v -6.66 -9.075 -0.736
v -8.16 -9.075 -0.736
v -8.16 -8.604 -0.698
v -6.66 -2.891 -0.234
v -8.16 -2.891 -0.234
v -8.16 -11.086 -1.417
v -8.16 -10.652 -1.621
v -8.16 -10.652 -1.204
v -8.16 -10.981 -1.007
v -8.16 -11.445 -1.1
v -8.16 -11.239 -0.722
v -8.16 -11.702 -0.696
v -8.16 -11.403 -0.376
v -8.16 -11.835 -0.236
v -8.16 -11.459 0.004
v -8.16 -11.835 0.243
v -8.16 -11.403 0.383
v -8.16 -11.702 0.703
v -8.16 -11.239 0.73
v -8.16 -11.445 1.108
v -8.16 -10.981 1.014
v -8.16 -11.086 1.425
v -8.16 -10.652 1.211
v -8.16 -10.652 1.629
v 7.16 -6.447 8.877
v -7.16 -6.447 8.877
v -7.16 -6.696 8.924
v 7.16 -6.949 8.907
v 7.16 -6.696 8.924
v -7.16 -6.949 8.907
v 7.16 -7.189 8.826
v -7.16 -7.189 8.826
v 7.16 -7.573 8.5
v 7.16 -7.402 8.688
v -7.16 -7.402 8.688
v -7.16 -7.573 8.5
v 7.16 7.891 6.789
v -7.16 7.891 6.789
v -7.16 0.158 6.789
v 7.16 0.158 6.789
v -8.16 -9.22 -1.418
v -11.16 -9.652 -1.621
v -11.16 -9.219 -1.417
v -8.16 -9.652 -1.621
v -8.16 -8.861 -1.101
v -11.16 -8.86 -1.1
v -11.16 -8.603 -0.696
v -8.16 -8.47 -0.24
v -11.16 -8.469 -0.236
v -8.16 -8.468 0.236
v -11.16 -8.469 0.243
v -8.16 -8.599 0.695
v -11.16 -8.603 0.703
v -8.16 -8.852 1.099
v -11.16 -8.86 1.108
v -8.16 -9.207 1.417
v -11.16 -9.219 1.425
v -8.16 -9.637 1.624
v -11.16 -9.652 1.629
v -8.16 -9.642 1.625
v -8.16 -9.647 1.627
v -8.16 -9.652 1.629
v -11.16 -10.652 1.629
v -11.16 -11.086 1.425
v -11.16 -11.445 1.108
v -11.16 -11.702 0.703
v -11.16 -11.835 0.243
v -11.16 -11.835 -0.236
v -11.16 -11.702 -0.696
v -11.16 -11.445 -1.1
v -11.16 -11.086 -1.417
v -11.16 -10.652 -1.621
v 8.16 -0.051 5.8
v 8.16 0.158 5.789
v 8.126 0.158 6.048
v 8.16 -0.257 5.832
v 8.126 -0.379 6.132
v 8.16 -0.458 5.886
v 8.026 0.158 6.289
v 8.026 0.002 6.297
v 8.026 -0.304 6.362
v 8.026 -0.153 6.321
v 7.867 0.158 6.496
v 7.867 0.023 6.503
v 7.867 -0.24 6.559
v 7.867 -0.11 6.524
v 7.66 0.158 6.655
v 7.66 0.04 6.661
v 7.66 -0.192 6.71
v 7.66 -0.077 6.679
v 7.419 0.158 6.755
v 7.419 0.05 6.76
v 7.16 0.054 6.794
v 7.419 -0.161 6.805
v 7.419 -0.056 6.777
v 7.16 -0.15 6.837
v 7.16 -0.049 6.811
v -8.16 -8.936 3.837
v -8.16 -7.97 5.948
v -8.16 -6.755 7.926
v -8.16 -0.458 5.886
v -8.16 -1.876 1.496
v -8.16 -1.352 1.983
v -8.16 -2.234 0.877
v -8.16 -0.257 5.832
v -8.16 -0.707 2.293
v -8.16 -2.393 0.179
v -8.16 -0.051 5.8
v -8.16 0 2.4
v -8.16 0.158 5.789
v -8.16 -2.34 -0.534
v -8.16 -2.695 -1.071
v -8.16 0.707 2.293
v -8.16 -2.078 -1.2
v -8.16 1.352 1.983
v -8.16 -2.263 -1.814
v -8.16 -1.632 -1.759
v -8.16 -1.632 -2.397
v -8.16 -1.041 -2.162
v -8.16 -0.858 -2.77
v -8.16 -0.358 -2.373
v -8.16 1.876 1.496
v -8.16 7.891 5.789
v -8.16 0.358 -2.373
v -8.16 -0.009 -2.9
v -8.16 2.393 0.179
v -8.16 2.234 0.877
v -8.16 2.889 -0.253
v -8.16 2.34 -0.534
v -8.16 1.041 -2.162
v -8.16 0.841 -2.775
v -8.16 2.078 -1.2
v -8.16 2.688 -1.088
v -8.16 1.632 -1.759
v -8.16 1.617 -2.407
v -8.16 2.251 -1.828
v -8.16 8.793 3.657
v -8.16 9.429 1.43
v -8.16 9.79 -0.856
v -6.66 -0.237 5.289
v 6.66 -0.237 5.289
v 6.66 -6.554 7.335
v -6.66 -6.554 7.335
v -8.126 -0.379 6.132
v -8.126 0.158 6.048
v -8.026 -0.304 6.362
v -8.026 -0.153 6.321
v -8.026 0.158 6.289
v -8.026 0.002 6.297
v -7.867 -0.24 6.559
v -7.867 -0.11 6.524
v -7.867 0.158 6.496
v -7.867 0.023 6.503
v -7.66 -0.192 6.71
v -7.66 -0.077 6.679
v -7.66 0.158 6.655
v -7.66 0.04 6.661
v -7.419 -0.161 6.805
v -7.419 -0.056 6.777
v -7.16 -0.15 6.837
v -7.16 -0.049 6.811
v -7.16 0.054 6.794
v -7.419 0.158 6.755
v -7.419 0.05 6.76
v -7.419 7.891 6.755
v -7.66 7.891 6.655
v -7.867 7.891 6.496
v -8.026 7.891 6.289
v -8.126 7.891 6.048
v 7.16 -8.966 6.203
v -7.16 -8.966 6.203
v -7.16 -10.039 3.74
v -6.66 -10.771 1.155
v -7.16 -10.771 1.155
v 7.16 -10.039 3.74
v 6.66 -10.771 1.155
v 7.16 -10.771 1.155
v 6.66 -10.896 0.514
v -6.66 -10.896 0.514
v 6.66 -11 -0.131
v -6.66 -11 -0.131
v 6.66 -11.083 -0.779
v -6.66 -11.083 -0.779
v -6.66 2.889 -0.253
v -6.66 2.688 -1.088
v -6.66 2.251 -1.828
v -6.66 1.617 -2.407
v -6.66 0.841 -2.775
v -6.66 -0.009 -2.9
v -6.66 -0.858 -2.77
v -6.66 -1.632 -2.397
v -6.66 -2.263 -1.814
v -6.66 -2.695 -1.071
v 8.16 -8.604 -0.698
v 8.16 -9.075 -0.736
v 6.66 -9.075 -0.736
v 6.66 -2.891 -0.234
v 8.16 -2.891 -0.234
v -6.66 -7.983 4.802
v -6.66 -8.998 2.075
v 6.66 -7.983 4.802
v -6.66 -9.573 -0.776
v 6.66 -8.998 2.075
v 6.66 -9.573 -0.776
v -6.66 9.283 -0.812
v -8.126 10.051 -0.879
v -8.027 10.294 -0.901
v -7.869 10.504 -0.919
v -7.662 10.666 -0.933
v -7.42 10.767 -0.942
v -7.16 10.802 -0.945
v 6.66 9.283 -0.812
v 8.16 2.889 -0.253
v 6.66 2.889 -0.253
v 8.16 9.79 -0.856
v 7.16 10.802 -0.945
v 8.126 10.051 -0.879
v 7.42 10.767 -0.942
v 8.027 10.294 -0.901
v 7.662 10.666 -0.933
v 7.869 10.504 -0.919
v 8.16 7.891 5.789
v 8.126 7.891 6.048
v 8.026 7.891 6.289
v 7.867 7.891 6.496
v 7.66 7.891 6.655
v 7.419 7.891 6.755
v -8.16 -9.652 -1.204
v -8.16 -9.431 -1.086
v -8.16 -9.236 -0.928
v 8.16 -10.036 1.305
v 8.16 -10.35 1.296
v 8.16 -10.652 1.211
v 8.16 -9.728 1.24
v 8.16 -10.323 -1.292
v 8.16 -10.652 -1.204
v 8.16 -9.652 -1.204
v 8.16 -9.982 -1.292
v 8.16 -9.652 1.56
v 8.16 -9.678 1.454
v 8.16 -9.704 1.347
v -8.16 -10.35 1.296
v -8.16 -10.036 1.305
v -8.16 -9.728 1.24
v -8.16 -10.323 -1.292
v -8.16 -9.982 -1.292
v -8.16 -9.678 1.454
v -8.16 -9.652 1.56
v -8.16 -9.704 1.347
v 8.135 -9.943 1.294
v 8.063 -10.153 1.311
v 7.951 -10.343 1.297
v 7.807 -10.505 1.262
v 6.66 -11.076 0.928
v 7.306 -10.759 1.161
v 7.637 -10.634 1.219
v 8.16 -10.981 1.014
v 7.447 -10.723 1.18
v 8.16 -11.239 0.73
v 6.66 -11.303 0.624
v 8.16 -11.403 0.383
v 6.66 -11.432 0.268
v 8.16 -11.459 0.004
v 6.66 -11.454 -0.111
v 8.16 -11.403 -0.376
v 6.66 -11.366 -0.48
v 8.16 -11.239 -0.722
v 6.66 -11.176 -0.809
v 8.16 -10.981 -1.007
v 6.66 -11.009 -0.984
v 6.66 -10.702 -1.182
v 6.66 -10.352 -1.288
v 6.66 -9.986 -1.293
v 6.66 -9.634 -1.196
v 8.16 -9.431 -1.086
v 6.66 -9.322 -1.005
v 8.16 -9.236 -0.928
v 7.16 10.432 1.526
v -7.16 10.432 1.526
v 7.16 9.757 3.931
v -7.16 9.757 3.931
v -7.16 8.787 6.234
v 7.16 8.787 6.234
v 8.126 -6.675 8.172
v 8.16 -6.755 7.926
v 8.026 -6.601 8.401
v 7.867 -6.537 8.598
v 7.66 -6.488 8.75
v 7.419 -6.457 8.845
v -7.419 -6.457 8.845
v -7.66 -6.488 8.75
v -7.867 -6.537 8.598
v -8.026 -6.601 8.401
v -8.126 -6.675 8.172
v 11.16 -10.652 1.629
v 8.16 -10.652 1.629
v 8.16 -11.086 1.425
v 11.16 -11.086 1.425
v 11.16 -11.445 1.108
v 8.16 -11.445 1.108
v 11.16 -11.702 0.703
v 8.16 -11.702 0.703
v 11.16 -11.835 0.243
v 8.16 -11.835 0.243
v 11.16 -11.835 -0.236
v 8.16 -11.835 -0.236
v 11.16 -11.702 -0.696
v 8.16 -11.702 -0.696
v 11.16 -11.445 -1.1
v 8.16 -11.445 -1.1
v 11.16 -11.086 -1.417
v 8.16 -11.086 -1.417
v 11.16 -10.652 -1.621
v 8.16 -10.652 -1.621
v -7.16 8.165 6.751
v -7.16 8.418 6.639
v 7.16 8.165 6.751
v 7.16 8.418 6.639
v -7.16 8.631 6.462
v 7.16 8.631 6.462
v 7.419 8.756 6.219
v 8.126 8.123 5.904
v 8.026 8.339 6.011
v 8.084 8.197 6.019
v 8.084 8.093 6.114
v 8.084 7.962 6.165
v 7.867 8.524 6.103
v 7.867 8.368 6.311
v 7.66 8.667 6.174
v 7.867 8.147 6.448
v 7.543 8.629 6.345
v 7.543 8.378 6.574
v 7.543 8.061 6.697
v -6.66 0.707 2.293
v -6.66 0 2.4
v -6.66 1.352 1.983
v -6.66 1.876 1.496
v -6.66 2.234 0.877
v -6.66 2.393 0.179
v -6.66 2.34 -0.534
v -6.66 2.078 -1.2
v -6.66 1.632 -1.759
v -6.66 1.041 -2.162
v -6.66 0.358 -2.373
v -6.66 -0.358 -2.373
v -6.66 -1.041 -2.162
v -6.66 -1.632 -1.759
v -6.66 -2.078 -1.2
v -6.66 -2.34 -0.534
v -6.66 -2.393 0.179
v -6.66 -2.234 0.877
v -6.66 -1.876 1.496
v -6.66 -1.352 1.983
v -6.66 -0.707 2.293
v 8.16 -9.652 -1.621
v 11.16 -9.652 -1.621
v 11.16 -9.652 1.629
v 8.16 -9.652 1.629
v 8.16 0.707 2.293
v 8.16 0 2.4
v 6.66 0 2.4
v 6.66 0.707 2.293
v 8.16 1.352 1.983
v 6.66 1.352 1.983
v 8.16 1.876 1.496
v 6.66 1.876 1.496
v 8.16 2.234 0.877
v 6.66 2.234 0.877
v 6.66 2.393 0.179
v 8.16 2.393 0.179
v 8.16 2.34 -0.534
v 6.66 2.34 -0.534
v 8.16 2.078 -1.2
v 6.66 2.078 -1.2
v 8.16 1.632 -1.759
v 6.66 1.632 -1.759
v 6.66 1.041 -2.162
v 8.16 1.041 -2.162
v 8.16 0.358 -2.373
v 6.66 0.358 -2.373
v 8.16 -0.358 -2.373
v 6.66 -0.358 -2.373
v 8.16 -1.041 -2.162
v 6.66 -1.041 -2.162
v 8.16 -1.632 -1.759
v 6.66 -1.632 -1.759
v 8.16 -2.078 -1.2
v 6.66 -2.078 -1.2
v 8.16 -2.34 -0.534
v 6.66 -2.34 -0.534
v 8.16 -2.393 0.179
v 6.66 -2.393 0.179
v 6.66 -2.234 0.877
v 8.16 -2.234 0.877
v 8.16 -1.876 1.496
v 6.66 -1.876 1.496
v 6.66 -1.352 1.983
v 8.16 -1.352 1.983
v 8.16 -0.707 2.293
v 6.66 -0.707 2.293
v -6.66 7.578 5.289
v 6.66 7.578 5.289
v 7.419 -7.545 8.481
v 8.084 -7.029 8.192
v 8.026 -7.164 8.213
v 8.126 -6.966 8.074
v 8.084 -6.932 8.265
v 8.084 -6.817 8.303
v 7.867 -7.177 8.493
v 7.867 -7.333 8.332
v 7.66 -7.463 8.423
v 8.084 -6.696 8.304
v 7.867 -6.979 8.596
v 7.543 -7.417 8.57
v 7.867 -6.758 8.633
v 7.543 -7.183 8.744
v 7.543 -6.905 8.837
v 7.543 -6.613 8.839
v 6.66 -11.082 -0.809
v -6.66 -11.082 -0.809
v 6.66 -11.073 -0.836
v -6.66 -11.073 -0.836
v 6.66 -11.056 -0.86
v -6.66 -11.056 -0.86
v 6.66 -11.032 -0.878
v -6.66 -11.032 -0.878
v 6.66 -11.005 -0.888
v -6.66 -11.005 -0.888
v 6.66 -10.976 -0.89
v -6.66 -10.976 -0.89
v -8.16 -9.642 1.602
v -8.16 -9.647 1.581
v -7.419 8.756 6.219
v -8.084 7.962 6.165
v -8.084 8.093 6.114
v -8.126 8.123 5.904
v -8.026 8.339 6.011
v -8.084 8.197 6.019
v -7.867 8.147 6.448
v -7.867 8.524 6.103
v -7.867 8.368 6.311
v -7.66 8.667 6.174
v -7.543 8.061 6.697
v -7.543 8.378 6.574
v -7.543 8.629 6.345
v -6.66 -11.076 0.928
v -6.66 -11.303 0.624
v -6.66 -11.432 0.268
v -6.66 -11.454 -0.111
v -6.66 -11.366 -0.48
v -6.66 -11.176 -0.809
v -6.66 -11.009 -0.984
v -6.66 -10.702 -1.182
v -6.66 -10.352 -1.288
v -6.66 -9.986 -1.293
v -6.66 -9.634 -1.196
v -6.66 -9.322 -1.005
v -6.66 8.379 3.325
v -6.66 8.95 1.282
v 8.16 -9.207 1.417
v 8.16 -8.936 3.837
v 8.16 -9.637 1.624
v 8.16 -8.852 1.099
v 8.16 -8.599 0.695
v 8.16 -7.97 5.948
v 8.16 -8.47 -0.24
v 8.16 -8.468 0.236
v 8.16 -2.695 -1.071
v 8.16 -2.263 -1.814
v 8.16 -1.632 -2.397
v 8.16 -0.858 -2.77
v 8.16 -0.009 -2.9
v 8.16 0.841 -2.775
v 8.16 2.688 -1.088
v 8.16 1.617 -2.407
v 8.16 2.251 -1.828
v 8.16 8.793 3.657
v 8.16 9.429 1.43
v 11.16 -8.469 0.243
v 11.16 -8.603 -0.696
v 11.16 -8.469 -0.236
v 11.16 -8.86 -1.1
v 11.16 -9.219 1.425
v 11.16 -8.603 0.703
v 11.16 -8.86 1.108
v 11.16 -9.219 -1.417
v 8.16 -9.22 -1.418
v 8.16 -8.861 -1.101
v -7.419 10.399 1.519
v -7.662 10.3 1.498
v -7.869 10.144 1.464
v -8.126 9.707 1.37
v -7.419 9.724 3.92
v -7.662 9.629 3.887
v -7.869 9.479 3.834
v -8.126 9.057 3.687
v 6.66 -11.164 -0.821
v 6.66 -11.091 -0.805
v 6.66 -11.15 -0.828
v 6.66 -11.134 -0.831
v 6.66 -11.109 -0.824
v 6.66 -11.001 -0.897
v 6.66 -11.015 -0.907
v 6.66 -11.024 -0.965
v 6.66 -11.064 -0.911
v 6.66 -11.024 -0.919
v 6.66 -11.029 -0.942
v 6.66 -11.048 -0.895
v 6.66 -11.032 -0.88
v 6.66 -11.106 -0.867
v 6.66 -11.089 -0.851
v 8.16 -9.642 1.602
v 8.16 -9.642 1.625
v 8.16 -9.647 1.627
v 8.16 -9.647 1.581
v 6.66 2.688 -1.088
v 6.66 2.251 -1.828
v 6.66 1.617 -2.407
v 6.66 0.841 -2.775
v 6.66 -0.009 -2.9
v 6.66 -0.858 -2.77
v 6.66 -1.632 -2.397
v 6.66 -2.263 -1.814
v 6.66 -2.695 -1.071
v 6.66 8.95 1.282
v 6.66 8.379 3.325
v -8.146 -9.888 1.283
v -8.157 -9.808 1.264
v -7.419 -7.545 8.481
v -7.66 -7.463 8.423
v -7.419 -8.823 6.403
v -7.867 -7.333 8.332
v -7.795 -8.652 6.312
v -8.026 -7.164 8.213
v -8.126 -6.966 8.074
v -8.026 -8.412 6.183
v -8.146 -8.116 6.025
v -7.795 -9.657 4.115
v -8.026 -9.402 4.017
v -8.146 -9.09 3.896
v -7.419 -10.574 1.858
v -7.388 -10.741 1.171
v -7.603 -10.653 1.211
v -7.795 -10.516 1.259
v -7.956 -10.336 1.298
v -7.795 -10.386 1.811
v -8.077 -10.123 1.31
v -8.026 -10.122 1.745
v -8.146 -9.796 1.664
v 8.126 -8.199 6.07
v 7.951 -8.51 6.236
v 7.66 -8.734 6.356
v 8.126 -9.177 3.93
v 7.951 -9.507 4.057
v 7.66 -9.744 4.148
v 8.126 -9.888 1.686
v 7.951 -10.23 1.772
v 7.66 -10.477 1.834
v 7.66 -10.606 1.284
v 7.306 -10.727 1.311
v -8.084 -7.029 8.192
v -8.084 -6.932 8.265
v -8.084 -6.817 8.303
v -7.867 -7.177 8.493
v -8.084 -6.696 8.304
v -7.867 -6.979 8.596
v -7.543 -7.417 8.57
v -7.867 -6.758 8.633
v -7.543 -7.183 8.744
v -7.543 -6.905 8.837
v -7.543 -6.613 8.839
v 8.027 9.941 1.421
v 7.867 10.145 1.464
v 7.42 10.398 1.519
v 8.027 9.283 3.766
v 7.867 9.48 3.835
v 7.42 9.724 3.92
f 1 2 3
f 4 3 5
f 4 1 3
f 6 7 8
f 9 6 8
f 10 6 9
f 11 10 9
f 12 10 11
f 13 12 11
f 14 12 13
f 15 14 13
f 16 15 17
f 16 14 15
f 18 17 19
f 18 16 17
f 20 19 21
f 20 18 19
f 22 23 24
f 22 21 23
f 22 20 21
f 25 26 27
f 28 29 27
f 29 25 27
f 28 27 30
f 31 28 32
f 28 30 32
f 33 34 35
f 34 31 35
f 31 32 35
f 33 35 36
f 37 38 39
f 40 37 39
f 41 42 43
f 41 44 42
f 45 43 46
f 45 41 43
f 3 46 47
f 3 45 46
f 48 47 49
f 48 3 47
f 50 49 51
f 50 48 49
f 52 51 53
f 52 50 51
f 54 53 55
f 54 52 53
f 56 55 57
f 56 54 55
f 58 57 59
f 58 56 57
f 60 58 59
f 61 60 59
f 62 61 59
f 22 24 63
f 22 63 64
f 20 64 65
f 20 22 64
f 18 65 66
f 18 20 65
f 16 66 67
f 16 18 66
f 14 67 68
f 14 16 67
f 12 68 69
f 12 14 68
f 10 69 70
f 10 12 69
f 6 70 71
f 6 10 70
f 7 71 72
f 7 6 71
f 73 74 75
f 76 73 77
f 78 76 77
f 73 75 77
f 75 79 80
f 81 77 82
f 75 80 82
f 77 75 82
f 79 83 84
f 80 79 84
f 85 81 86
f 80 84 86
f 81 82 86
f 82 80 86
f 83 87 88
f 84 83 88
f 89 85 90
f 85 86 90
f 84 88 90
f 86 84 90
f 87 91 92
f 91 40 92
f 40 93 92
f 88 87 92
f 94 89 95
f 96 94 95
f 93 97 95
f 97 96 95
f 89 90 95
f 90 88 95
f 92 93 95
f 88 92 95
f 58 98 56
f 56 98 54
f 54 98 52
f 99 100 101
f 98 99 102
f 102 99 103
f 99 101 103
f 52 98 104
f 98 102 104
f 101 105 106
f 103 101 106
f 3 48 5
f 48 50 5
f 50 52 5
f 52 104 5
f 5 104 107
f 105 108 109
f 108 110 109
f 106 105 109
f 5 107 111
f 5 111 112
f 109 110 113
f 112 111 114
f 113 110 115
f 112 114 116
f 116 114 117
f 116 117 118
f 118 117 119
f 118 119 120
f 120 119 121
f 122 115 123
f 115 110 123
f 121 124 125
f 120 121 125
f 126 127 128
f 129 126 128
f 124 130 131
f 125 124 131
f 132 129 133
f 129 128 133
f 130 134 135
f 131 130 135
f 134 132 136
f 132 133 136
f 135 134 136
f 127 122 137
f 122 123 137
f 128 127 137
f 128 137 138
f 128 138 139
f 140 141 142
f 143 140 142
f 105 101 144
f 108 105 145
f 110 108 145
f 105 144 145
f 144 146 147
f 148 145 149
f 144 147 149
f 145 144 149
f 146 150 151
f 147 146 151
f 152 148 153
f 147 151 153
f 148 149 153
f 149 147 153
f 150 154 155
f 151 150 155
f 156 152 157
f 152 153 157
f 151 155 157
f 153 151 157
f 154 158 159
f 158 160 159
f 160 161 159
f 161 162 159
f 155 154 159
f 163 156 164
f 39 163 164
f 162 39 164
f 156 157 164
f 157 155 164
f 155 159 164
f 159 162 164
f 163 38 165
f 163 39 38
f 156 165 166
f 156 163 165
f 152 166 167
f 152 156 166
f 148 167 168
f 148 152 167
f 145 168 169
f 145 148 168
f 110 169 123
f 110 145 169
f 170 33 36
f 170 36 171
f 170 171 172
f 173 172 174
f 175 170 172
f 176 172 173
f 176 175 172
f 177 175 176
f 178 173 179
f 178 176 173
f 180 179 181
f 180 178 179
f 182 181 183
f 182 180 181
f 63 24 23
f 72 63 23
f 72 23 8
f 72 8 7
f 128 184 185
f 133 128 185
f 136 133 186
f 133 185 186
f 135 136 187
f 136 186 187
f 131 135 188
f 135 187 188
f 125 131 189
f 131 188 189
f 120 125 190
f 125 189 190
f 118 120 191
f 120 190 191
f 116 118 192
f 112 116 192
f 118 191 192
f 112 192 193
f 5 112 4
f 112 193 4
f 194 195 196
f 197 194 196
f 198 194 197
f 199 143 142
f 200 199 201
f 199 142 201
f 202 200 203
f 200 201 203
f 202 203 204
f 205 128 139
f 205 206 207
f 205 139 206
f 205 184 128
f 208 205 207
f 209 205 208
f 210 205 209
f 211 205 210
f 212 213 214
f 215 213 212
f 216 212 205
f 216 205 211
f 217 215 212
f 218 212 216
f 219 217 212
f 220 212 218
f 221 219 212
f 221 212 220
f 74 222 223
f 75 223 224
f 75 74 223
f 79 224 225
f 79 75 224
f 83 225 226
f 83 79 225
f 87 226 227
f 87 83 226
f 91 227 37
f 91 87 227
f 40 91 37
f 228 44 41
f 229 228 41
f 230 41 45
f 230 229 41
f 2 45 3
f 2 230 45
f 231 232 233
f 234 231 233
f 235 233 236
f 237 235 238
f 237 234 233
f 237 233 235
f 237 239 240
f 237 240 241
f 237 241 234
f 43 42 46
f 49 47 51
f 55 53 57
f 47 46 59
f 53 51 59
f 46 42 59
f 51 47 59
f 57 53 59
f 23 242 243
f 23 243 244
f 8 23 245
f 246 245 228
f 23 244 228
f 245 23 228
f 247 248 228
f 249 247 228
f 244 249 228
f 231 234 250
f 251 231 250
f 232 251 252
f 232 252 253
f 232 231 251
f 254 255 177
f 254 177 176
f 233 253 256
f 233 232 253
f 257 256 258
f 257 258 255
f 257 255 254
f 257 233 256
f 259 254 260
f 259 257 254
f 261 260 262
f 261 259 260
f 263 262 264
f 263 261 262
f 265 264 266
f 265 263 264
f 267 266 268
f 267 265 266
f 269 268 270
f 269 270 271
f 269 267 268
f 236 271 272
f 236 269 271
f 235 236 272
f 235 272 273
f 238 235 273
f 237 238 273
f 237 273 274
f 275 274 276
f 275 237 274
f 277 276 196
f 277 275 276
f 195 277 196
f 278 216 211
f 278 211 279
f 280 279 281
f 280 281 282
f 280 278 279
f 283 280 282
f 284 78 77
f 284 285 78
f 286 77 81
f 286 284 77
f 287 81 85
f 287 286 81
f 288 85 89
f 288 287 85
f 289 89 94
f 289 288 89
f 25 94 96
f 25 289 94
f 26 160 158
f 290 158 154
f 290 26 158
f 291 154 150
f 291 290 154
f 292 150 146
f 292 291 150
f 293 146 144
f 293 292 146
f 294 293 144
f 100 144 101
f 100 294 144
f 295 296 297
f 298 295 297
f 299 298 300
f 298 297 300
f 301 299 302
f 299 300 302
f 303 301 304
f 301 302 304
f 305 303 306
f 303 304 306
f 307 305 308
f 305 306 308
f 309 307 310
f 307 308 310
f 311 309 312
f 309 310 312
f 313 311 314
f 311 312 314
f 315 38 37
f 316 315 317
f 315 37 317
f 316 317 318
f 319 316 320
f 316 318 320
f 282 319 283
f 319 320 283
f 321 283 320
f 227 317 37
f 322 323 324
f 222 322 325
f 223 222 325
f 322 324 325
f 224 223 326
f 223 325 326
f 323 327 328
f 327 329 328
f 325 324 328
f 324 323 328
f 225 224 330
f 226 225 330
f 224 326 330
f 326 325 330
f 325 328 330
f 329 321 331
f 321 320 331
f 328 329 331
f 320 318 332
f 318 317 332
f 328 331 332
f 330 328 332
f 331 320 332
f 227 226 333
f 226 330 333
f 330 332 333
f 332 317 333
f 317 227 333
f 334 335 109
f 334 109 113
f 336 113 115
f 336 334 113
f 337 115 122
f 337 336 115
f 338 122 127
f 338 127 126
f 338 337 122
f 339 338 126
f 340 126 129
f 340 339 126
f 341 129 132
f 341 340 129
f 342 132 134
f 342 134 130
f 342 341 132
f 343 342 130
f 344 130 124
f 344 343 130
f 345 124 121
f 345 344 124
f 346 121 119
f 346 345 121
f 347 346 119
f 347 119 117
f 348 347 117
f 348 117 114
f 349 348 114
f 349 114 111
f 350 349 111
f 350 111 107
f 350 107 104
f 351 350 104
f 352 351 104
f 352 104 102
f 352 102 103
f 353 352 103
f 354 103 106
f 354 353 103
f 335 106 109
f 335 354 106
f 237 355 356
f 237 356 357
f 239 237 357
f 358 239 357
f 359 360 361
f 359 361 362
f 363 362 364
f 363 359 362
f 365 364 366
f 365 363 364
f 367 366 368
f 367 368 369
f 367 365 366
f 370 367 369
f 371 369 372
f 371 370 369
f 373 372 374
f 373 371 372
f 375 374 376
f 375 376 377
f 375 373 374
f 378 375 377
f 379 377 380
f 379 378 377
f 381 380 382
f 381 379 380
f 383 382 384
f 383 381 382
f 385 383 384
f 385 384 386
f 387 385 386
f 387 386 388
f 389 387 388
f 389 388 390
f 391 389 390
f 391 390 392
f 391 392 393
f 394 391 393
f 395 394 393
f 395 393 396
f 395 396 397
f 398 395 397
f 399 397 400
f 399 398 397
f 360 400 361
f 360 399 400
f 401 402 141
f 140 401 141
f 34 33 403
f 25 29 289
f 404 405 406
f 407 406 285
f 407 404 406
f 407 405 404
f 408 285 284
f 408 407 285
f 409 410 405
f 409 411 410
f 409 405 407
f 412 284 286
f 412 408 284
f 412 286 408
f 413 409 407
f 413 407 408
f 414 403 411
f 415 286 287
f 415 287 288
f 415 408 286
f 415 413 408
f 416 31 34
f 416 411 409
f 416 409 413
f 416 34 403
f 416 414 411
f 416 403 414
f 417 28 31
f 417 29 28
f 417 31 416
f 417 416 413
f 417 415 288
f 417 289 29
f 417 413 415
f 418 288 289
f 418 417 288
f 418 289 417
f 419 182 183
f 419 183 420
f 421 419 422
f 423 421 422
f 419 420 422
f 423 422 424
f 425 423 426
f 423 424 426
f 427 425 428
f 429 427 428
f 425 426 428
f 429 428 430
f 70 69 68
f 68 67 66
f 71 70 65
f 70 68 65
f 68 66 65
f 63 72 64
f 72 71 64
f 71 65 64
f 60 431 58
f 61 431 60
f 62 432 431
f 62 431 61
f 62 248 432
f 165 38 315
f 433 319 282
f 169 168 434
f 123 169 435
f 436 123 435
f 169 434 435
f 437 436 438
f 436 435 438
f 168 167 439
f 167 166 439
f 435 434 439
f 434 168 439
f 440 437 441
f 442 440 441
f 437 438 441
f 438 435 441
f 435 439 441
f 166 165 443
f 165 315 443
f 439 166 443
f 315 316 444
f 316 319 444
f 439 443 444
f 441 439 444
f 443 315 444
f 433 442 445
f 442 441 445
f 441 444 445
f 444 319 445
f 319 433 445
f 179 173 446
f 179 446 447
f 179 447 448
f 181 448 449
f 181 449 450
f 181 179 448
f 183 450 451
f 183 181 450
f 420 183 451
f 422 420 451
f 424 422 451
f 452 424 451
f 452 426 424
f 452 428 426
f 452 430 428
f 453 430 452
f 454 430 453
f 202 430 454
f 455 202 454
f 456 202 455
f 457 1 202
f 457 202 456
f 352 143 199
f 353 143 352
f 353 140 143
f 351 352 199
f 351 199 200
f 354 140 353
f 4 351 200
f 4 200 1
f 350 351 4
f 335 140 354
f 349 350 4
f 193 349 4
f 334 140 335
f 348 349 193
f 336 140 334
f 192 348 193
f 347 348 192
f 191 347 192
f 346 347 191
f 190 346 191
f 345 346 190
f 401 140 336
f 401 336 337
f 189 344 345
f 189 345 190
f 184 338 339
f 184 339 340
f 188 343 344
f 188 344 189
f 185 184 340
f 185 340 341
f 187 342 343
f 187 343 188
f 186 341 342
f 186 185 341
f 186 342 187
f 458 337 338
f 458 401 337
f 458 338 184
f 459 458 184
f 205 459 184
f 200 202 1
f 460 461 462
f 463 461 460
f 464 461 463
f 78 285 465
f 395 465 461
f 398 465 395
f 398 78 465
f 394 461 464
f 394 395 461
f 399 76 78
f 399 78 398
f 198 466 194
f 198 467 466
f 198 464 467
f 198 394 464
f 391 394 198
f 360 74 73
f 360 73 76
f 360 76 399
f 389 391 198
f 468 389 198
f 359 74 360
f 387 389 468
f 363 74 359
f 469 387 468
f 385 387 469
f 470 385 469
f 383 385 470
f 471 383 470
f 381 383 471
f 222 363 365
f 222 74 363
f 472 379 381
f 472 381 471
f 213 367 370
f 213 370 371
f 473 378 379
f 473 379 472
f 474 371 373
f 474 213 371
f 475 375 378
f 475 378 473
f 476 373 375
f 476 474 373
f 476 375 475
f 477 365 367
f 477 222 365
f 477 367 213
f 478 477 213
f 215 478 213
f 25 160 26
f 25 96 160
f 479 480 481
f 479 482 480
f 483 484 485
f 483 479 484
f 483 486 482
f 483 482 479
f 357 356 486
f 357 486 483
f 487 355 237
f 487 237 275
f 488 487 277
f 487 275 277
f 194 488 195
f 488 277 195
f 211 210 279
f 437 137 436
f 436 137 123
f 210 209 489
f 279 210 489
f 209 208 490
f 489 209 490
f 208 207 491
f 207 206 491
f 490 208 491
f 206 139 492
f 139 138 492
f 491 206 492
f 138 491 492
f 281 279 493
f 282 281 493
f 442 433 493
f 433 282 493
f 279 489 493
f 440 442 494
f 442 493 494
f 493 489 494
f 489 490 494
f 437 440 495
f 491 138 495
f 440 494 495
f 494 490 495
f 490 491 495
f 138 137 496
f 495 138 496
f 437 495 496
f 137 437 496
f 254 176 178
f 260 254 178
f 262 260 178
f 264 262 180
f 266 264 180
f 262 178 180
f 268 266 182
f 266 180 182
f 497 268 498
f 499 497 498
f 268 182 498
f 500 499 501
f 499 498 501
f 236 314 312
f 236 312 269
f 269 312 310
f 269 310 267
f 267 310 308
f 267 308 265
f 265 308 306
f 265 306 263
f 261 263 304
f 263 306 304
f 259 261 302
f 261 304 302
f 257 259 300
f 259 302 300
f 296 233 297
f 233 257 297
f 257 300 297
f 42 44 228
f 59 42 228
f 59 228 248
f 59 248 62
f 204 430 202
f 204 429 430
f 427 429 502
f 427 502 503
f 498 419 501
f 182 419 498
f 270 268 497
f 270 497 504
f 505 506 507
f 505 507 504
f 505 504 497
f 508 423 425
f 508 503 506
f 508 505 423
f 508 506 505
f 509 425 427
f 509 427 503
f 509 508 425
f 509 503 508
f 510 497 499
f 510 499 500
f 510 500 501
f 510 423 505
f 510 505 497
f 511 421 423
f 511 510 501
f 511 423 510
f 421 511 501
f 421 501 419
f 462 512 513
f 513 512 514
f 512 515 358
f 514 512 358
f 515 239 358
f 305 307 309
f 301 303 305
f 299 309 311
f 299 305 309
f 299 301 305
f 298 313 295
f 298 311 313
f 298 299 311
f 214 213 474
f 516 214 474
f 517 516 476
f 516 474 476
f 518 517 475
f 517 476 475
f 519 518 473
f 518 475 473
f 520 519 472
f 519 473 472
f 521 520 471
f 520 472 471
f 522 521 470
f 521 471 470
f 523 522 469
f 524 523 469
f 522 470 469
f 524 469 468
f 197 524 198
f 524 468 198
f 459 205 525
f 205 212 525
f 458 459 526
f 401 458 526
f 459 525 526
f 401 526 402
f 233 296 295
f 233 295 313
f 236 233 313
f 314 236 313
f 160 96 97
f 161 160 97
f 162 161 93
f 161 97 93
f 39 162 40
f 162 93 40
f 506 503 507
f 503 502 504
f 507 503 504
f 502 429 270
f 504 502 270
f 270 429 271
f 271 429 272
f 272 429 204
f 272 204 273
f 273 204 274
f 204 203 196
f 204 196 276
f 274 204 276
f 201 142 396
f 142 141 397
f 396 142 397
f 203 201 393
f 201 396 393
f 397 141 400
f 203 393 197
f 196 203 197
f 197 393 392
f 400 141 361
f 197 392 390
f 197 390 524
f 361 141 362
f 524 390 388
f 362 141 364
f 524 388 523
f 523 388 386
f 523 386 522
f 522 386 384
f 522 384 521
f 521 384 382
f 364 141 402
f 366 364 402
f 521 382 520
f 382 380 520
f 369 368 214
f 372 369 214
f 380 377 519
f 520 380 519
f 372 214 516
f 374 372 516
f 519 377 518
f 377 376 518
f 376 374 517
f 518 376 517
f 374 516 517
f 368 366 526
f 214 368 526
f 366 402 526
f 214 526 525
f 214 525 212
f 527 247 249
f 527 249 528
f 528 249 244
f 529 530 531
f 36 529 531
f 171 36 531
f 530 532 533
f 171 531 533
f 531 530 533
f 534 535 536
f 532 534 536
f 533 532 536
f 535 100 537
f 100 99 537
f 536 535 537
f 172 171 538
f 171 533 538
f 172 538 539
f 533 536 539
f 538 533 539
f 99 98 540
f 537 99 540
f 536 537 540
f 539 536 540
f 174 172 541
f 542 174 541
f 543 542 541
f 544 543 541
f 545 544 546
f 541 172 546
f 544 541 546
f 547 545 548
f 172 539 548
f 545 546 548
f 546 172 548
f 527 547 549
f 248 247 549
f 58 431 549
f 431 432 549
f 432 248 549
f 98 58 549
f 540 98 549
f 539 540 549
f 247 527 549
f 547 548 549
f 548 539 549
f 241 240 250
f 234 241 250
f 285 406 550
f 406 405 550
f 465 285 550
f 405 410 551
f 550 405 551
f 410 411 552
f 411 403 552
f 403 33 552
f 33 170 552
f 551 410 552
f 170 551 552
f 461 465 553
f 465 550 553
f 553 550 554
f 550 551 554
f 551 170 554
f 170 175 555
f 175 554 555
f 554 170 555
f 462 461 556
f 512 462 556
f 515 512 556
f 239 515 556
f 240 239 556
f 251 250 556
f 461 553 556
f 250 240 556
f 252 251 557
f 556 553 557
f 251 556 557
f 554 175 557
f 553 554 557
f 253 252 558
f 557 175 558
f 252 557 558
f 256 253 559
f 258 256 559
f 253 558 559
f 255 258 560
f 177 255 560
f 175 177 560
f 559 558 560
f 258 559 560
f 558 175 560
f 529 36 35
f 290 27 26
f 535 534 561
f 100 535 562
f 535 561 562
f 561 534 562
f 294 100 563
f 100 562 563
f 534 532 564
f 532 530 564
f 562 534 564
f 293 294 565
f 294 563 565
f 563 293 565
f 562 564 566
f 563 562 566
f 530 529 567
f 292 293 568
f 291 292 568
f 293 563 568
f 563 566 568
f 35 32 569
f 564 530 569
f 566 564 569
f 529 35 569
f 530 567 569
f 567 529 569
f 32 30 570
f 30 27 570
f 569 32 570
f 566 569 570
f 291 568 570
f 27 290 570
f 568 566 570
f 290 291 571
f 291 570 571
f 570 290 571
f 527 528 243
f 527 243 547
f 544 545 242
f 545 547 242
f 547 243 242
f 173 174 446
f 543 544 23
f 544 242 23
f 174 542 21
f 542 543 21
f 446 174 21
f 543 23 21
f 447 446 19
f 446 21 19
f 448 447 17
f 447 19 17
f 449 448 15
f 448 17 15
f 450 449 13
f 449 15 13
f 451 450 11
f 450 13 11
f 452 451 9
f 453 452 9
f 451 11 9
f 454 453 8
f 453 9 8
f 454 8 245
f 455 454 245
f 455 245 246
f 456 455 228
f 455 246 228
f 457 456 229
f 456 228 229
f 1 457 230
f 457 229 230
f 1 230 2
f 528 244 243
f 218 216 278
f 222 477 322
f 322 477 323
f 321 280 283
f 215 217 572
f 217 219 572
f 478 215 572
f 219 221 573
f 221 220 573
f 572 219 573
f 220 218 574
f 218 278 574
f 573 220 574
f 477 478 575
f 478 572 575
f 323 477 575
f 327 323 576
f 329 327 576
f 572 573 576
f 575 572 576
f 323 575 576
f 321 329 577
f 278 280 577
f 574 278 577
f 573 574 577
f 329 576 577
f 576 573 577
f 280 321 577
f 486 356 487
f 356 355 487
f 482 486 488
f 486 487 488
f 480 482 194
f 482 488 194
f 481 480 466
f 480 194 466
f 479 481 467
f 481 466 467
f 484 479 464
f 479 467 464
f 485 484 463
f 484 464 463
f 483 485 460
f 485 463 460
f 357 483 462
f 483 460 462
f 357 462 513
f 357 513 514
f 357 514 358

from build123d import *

# Parameters (mm, degrees)
Y_KSEKLIK_EKSTR_ZYON1_DEPTH = 8.16
BO_ALTMA1_T                 = -1.5
Y_KSEKLIK_EKSTR_ZYON6_START = -1.5
IZIM3_R                     = 2.9
IZIM3_R_2                   = 2.4
Y_KSEKLIK_EKSTR_ZYON6_DEPTH = 1.5
Y_KSEKLIK_EKSTR_ZYON8_START = -1.5
IZIM14_R                    = 2.9
IZIM14_R_2                  = 2.4
Y_KSEKLIK_EKSTR_ZYON8_DEPTH = 1.5
IZIM4_R                     = 1.306876714
Y_KSEKLIK_EKSTR_ZYON7_DEPTH = 1.5
RADYUS1_R                   = 1
IZIM15_R                    = 1.7
Y_KSEKLIK_EKSTR_ZYON9_DEPTH = 3
KES_EKSTR_ZYON1_START       = -3
KES_EKSTR_ZYON1_DEPTH       = 3
RADYUS2_R                   = 0.1


with BuildPart() as part:
    # Çizim1 → Yükseklik-Ekstrüzyon1 (new, symmetric)
    with BuildSketch(Plane(origin=(0, 0, 0), x_dir=(0, 0, -1), z_dir=(1, 0, 0))):
        with BuildLine():
            ThreePointArc((0.234441748, -2.890508098), (-2.899985447, 0.009187423), (0.252751654, 2.888964624))
            Line((0.252751654, 2.888964624), (0.945048542, 10.801954259))
            ThreePointArc((0.945048542, 10.801954259), (-3.03918883, 10.045066442), (-6.788828319, 8.5))
            Line((-6.788828319, 8.5), (-6.788828319, 0))
            Line((-6.788828319, 0), (-9.1, -7.135018252))
            ThreePointArc((-9.1, -7.135018252), (-4.371300658, -9.800569865), (0.9, -11.096390933))
            Line((0.9, -11.096390933), (0.234441748, -2.890508098))
        make_face()
    extrude(amount=Y_KSEKLIK_EKSTR_ZYON1_DEPTH, both=True)

    # İç Boşaltma1
    bo_altma1_openings = [part.faces().sort_by_distance(p)[0] for p in [
        (0, 6.845459442, -0.598900098),
        (0, 0.009187423, 2.899985447),
        (0, -6.993449516, -0.567220874),
    ]]
    offset(amount=BO_ALTMA1_T, openings=bo_altma1_openings, kind=Kind.INTERSECTION)

    # Çizim3 → Yükseklik-Ekstrüzyon6 (add)
    with BuildSketch(Plane.ZY.offset(-6.66).offset(Y_KSEKLIK_EKSTR_ZYON6_START)):
        Circle(IZIM3_R)
        Circle(IZIM3_R_2, mode=Mode.SUBTRACT)
    extrude(amount=Y_KSEKLIK_EKSTR_ZYON6_DEPTH)

    # Çizim14 → Yükseklik-Ekstrüzyon8 (add)
    with BuildSketch(Plane.ZY.offset(8.16).offset(Y_KSEKLIK_EKSTR_ZYON8_START)):
        Circle(IZIM14_R)
        Circle(IZIM14_R_2, mode=Mode.SUBTRACT)
    extrude(amount=Y_KSEKLIK_EKSTR_ZYON8_DEPTH)

    # Çizim4 → Yükseklik-Ekstrüzyon7 (add)
    with BuildSketch(Plane(origin=(8.16, 0, 0), x_dir=(0, 0, -1), z_dir=(1, 0, 0))):
        with Locations((-0.003711184, -10.152339642)):
            Circle(IZIM4_R)
    y_kseklik_ekstr_zyon7 = extrude(amount=-Y_KSEKLIK_EKSTR_ZYON7_DEPTH)

    # Aynalama2: Yükseklik-Ekstrüzyon7 across plane
    add(y_kseklik_ekstr_zyon7.mirror(Plane(origin=(0, 0, 0), x_dir=(0, 0, 1), z_dir=(1, 0, 0))))

    # Radyus1
    radyus1_edges = [part.edges().sort_by_distance(p)[0] for p in [
        (-8.16, -3.567509126, 7.94441416),
        (-8.16, 4.25, 6.788828319),
        (-8.16, 10.045066442, 3.03918883),
        (8.16, -3.567509126, 7.94441416),
        (0, -7.135018252, 9.1),
        (0, 0, 6.788828319),
        (0, 8.5, 6.788828319),
        (8.16, -9.392319843, 5.328384781),
        (8.16, 10.045066442, 3.03918883),
        (8.16, 4.25, 6.788828319),
        (-8.16, -9.392319843, 5.328384781),
    ]]
    fillet(radyus1_edges, radius=RADYUS1_R)

    # Çizim15 → Yükseklik-Ekstrüzyon9 (add)
    with BuildSketch(Plane(origin=(8.16, 0, 0), x_dir=(0, 0, -1), z_dir=(1, 0, 0))):
        with Locations(Location((-0.003711184, -10.152339642, 0), (0, 0, 162.33899623))):
            Circle(IZIM15_R)
    y_kseklik_ekstr_zyon9 = extrude(amount=Y_KSEKLIK_EKSTR_ZYON9_DEPTH)

    # Çizim16 → Kes-Ekstrüzyon1 (cut)
    with BuildSketch(Plane(origin=(11.16, 0, 0), x_dir=(0, 0, -1), z_dir=(1, 0, 0)).offset(KES_EKSTR_ZYON1_START)):
        with BuildLine():
            Line((1.621096497, -9.652339642), (-1.628518865, -9.652339642))
            ThreePointArc((-1.628518865, -9.652339642), (-1.703711184, -10.152339642), (-1.628518865, -10.652339642))
            Line((-1.628518865, -10.652339642), (1.621096497, -10.652339642))
            ThreePointArc((1.621096497, -10.652339642), (1.696288816, -10.152339642), (1.621096497, -9.652339642))
        make_face()
    kes_ekstr_zyon1 = extrude(amount=KES_EKSTR_ZYON1_DEPTH, mode=Mode.SUBTRACT)

    # Aynalama4: Yükseklik-Ekstrüzyon9, Kes-Ekstrüzyon1 across plane
    add(y_kseklik_ekstr_zyon9.mirror(Plane(origin=(0, 0, 0), x_dir=(0, 0, 1), z_dir=(1, 0, 0))))
    add(kes_ekstr_zyon1.mirror(Plane(origin=(0, 0, 0), x_dir=(0, 0, 1), z_dir=(1, 0, 0))), mode=Mode.SUBTRACT)

    # Radyus2
    radyus2_edges = [part.edges().sort_by_distance(p)[0] for p in [
        (0, -11.096390933, -0.9),
    ]]
    fillet(radyus2_edges, radius=RADYUS2_R)


solid = part.part
